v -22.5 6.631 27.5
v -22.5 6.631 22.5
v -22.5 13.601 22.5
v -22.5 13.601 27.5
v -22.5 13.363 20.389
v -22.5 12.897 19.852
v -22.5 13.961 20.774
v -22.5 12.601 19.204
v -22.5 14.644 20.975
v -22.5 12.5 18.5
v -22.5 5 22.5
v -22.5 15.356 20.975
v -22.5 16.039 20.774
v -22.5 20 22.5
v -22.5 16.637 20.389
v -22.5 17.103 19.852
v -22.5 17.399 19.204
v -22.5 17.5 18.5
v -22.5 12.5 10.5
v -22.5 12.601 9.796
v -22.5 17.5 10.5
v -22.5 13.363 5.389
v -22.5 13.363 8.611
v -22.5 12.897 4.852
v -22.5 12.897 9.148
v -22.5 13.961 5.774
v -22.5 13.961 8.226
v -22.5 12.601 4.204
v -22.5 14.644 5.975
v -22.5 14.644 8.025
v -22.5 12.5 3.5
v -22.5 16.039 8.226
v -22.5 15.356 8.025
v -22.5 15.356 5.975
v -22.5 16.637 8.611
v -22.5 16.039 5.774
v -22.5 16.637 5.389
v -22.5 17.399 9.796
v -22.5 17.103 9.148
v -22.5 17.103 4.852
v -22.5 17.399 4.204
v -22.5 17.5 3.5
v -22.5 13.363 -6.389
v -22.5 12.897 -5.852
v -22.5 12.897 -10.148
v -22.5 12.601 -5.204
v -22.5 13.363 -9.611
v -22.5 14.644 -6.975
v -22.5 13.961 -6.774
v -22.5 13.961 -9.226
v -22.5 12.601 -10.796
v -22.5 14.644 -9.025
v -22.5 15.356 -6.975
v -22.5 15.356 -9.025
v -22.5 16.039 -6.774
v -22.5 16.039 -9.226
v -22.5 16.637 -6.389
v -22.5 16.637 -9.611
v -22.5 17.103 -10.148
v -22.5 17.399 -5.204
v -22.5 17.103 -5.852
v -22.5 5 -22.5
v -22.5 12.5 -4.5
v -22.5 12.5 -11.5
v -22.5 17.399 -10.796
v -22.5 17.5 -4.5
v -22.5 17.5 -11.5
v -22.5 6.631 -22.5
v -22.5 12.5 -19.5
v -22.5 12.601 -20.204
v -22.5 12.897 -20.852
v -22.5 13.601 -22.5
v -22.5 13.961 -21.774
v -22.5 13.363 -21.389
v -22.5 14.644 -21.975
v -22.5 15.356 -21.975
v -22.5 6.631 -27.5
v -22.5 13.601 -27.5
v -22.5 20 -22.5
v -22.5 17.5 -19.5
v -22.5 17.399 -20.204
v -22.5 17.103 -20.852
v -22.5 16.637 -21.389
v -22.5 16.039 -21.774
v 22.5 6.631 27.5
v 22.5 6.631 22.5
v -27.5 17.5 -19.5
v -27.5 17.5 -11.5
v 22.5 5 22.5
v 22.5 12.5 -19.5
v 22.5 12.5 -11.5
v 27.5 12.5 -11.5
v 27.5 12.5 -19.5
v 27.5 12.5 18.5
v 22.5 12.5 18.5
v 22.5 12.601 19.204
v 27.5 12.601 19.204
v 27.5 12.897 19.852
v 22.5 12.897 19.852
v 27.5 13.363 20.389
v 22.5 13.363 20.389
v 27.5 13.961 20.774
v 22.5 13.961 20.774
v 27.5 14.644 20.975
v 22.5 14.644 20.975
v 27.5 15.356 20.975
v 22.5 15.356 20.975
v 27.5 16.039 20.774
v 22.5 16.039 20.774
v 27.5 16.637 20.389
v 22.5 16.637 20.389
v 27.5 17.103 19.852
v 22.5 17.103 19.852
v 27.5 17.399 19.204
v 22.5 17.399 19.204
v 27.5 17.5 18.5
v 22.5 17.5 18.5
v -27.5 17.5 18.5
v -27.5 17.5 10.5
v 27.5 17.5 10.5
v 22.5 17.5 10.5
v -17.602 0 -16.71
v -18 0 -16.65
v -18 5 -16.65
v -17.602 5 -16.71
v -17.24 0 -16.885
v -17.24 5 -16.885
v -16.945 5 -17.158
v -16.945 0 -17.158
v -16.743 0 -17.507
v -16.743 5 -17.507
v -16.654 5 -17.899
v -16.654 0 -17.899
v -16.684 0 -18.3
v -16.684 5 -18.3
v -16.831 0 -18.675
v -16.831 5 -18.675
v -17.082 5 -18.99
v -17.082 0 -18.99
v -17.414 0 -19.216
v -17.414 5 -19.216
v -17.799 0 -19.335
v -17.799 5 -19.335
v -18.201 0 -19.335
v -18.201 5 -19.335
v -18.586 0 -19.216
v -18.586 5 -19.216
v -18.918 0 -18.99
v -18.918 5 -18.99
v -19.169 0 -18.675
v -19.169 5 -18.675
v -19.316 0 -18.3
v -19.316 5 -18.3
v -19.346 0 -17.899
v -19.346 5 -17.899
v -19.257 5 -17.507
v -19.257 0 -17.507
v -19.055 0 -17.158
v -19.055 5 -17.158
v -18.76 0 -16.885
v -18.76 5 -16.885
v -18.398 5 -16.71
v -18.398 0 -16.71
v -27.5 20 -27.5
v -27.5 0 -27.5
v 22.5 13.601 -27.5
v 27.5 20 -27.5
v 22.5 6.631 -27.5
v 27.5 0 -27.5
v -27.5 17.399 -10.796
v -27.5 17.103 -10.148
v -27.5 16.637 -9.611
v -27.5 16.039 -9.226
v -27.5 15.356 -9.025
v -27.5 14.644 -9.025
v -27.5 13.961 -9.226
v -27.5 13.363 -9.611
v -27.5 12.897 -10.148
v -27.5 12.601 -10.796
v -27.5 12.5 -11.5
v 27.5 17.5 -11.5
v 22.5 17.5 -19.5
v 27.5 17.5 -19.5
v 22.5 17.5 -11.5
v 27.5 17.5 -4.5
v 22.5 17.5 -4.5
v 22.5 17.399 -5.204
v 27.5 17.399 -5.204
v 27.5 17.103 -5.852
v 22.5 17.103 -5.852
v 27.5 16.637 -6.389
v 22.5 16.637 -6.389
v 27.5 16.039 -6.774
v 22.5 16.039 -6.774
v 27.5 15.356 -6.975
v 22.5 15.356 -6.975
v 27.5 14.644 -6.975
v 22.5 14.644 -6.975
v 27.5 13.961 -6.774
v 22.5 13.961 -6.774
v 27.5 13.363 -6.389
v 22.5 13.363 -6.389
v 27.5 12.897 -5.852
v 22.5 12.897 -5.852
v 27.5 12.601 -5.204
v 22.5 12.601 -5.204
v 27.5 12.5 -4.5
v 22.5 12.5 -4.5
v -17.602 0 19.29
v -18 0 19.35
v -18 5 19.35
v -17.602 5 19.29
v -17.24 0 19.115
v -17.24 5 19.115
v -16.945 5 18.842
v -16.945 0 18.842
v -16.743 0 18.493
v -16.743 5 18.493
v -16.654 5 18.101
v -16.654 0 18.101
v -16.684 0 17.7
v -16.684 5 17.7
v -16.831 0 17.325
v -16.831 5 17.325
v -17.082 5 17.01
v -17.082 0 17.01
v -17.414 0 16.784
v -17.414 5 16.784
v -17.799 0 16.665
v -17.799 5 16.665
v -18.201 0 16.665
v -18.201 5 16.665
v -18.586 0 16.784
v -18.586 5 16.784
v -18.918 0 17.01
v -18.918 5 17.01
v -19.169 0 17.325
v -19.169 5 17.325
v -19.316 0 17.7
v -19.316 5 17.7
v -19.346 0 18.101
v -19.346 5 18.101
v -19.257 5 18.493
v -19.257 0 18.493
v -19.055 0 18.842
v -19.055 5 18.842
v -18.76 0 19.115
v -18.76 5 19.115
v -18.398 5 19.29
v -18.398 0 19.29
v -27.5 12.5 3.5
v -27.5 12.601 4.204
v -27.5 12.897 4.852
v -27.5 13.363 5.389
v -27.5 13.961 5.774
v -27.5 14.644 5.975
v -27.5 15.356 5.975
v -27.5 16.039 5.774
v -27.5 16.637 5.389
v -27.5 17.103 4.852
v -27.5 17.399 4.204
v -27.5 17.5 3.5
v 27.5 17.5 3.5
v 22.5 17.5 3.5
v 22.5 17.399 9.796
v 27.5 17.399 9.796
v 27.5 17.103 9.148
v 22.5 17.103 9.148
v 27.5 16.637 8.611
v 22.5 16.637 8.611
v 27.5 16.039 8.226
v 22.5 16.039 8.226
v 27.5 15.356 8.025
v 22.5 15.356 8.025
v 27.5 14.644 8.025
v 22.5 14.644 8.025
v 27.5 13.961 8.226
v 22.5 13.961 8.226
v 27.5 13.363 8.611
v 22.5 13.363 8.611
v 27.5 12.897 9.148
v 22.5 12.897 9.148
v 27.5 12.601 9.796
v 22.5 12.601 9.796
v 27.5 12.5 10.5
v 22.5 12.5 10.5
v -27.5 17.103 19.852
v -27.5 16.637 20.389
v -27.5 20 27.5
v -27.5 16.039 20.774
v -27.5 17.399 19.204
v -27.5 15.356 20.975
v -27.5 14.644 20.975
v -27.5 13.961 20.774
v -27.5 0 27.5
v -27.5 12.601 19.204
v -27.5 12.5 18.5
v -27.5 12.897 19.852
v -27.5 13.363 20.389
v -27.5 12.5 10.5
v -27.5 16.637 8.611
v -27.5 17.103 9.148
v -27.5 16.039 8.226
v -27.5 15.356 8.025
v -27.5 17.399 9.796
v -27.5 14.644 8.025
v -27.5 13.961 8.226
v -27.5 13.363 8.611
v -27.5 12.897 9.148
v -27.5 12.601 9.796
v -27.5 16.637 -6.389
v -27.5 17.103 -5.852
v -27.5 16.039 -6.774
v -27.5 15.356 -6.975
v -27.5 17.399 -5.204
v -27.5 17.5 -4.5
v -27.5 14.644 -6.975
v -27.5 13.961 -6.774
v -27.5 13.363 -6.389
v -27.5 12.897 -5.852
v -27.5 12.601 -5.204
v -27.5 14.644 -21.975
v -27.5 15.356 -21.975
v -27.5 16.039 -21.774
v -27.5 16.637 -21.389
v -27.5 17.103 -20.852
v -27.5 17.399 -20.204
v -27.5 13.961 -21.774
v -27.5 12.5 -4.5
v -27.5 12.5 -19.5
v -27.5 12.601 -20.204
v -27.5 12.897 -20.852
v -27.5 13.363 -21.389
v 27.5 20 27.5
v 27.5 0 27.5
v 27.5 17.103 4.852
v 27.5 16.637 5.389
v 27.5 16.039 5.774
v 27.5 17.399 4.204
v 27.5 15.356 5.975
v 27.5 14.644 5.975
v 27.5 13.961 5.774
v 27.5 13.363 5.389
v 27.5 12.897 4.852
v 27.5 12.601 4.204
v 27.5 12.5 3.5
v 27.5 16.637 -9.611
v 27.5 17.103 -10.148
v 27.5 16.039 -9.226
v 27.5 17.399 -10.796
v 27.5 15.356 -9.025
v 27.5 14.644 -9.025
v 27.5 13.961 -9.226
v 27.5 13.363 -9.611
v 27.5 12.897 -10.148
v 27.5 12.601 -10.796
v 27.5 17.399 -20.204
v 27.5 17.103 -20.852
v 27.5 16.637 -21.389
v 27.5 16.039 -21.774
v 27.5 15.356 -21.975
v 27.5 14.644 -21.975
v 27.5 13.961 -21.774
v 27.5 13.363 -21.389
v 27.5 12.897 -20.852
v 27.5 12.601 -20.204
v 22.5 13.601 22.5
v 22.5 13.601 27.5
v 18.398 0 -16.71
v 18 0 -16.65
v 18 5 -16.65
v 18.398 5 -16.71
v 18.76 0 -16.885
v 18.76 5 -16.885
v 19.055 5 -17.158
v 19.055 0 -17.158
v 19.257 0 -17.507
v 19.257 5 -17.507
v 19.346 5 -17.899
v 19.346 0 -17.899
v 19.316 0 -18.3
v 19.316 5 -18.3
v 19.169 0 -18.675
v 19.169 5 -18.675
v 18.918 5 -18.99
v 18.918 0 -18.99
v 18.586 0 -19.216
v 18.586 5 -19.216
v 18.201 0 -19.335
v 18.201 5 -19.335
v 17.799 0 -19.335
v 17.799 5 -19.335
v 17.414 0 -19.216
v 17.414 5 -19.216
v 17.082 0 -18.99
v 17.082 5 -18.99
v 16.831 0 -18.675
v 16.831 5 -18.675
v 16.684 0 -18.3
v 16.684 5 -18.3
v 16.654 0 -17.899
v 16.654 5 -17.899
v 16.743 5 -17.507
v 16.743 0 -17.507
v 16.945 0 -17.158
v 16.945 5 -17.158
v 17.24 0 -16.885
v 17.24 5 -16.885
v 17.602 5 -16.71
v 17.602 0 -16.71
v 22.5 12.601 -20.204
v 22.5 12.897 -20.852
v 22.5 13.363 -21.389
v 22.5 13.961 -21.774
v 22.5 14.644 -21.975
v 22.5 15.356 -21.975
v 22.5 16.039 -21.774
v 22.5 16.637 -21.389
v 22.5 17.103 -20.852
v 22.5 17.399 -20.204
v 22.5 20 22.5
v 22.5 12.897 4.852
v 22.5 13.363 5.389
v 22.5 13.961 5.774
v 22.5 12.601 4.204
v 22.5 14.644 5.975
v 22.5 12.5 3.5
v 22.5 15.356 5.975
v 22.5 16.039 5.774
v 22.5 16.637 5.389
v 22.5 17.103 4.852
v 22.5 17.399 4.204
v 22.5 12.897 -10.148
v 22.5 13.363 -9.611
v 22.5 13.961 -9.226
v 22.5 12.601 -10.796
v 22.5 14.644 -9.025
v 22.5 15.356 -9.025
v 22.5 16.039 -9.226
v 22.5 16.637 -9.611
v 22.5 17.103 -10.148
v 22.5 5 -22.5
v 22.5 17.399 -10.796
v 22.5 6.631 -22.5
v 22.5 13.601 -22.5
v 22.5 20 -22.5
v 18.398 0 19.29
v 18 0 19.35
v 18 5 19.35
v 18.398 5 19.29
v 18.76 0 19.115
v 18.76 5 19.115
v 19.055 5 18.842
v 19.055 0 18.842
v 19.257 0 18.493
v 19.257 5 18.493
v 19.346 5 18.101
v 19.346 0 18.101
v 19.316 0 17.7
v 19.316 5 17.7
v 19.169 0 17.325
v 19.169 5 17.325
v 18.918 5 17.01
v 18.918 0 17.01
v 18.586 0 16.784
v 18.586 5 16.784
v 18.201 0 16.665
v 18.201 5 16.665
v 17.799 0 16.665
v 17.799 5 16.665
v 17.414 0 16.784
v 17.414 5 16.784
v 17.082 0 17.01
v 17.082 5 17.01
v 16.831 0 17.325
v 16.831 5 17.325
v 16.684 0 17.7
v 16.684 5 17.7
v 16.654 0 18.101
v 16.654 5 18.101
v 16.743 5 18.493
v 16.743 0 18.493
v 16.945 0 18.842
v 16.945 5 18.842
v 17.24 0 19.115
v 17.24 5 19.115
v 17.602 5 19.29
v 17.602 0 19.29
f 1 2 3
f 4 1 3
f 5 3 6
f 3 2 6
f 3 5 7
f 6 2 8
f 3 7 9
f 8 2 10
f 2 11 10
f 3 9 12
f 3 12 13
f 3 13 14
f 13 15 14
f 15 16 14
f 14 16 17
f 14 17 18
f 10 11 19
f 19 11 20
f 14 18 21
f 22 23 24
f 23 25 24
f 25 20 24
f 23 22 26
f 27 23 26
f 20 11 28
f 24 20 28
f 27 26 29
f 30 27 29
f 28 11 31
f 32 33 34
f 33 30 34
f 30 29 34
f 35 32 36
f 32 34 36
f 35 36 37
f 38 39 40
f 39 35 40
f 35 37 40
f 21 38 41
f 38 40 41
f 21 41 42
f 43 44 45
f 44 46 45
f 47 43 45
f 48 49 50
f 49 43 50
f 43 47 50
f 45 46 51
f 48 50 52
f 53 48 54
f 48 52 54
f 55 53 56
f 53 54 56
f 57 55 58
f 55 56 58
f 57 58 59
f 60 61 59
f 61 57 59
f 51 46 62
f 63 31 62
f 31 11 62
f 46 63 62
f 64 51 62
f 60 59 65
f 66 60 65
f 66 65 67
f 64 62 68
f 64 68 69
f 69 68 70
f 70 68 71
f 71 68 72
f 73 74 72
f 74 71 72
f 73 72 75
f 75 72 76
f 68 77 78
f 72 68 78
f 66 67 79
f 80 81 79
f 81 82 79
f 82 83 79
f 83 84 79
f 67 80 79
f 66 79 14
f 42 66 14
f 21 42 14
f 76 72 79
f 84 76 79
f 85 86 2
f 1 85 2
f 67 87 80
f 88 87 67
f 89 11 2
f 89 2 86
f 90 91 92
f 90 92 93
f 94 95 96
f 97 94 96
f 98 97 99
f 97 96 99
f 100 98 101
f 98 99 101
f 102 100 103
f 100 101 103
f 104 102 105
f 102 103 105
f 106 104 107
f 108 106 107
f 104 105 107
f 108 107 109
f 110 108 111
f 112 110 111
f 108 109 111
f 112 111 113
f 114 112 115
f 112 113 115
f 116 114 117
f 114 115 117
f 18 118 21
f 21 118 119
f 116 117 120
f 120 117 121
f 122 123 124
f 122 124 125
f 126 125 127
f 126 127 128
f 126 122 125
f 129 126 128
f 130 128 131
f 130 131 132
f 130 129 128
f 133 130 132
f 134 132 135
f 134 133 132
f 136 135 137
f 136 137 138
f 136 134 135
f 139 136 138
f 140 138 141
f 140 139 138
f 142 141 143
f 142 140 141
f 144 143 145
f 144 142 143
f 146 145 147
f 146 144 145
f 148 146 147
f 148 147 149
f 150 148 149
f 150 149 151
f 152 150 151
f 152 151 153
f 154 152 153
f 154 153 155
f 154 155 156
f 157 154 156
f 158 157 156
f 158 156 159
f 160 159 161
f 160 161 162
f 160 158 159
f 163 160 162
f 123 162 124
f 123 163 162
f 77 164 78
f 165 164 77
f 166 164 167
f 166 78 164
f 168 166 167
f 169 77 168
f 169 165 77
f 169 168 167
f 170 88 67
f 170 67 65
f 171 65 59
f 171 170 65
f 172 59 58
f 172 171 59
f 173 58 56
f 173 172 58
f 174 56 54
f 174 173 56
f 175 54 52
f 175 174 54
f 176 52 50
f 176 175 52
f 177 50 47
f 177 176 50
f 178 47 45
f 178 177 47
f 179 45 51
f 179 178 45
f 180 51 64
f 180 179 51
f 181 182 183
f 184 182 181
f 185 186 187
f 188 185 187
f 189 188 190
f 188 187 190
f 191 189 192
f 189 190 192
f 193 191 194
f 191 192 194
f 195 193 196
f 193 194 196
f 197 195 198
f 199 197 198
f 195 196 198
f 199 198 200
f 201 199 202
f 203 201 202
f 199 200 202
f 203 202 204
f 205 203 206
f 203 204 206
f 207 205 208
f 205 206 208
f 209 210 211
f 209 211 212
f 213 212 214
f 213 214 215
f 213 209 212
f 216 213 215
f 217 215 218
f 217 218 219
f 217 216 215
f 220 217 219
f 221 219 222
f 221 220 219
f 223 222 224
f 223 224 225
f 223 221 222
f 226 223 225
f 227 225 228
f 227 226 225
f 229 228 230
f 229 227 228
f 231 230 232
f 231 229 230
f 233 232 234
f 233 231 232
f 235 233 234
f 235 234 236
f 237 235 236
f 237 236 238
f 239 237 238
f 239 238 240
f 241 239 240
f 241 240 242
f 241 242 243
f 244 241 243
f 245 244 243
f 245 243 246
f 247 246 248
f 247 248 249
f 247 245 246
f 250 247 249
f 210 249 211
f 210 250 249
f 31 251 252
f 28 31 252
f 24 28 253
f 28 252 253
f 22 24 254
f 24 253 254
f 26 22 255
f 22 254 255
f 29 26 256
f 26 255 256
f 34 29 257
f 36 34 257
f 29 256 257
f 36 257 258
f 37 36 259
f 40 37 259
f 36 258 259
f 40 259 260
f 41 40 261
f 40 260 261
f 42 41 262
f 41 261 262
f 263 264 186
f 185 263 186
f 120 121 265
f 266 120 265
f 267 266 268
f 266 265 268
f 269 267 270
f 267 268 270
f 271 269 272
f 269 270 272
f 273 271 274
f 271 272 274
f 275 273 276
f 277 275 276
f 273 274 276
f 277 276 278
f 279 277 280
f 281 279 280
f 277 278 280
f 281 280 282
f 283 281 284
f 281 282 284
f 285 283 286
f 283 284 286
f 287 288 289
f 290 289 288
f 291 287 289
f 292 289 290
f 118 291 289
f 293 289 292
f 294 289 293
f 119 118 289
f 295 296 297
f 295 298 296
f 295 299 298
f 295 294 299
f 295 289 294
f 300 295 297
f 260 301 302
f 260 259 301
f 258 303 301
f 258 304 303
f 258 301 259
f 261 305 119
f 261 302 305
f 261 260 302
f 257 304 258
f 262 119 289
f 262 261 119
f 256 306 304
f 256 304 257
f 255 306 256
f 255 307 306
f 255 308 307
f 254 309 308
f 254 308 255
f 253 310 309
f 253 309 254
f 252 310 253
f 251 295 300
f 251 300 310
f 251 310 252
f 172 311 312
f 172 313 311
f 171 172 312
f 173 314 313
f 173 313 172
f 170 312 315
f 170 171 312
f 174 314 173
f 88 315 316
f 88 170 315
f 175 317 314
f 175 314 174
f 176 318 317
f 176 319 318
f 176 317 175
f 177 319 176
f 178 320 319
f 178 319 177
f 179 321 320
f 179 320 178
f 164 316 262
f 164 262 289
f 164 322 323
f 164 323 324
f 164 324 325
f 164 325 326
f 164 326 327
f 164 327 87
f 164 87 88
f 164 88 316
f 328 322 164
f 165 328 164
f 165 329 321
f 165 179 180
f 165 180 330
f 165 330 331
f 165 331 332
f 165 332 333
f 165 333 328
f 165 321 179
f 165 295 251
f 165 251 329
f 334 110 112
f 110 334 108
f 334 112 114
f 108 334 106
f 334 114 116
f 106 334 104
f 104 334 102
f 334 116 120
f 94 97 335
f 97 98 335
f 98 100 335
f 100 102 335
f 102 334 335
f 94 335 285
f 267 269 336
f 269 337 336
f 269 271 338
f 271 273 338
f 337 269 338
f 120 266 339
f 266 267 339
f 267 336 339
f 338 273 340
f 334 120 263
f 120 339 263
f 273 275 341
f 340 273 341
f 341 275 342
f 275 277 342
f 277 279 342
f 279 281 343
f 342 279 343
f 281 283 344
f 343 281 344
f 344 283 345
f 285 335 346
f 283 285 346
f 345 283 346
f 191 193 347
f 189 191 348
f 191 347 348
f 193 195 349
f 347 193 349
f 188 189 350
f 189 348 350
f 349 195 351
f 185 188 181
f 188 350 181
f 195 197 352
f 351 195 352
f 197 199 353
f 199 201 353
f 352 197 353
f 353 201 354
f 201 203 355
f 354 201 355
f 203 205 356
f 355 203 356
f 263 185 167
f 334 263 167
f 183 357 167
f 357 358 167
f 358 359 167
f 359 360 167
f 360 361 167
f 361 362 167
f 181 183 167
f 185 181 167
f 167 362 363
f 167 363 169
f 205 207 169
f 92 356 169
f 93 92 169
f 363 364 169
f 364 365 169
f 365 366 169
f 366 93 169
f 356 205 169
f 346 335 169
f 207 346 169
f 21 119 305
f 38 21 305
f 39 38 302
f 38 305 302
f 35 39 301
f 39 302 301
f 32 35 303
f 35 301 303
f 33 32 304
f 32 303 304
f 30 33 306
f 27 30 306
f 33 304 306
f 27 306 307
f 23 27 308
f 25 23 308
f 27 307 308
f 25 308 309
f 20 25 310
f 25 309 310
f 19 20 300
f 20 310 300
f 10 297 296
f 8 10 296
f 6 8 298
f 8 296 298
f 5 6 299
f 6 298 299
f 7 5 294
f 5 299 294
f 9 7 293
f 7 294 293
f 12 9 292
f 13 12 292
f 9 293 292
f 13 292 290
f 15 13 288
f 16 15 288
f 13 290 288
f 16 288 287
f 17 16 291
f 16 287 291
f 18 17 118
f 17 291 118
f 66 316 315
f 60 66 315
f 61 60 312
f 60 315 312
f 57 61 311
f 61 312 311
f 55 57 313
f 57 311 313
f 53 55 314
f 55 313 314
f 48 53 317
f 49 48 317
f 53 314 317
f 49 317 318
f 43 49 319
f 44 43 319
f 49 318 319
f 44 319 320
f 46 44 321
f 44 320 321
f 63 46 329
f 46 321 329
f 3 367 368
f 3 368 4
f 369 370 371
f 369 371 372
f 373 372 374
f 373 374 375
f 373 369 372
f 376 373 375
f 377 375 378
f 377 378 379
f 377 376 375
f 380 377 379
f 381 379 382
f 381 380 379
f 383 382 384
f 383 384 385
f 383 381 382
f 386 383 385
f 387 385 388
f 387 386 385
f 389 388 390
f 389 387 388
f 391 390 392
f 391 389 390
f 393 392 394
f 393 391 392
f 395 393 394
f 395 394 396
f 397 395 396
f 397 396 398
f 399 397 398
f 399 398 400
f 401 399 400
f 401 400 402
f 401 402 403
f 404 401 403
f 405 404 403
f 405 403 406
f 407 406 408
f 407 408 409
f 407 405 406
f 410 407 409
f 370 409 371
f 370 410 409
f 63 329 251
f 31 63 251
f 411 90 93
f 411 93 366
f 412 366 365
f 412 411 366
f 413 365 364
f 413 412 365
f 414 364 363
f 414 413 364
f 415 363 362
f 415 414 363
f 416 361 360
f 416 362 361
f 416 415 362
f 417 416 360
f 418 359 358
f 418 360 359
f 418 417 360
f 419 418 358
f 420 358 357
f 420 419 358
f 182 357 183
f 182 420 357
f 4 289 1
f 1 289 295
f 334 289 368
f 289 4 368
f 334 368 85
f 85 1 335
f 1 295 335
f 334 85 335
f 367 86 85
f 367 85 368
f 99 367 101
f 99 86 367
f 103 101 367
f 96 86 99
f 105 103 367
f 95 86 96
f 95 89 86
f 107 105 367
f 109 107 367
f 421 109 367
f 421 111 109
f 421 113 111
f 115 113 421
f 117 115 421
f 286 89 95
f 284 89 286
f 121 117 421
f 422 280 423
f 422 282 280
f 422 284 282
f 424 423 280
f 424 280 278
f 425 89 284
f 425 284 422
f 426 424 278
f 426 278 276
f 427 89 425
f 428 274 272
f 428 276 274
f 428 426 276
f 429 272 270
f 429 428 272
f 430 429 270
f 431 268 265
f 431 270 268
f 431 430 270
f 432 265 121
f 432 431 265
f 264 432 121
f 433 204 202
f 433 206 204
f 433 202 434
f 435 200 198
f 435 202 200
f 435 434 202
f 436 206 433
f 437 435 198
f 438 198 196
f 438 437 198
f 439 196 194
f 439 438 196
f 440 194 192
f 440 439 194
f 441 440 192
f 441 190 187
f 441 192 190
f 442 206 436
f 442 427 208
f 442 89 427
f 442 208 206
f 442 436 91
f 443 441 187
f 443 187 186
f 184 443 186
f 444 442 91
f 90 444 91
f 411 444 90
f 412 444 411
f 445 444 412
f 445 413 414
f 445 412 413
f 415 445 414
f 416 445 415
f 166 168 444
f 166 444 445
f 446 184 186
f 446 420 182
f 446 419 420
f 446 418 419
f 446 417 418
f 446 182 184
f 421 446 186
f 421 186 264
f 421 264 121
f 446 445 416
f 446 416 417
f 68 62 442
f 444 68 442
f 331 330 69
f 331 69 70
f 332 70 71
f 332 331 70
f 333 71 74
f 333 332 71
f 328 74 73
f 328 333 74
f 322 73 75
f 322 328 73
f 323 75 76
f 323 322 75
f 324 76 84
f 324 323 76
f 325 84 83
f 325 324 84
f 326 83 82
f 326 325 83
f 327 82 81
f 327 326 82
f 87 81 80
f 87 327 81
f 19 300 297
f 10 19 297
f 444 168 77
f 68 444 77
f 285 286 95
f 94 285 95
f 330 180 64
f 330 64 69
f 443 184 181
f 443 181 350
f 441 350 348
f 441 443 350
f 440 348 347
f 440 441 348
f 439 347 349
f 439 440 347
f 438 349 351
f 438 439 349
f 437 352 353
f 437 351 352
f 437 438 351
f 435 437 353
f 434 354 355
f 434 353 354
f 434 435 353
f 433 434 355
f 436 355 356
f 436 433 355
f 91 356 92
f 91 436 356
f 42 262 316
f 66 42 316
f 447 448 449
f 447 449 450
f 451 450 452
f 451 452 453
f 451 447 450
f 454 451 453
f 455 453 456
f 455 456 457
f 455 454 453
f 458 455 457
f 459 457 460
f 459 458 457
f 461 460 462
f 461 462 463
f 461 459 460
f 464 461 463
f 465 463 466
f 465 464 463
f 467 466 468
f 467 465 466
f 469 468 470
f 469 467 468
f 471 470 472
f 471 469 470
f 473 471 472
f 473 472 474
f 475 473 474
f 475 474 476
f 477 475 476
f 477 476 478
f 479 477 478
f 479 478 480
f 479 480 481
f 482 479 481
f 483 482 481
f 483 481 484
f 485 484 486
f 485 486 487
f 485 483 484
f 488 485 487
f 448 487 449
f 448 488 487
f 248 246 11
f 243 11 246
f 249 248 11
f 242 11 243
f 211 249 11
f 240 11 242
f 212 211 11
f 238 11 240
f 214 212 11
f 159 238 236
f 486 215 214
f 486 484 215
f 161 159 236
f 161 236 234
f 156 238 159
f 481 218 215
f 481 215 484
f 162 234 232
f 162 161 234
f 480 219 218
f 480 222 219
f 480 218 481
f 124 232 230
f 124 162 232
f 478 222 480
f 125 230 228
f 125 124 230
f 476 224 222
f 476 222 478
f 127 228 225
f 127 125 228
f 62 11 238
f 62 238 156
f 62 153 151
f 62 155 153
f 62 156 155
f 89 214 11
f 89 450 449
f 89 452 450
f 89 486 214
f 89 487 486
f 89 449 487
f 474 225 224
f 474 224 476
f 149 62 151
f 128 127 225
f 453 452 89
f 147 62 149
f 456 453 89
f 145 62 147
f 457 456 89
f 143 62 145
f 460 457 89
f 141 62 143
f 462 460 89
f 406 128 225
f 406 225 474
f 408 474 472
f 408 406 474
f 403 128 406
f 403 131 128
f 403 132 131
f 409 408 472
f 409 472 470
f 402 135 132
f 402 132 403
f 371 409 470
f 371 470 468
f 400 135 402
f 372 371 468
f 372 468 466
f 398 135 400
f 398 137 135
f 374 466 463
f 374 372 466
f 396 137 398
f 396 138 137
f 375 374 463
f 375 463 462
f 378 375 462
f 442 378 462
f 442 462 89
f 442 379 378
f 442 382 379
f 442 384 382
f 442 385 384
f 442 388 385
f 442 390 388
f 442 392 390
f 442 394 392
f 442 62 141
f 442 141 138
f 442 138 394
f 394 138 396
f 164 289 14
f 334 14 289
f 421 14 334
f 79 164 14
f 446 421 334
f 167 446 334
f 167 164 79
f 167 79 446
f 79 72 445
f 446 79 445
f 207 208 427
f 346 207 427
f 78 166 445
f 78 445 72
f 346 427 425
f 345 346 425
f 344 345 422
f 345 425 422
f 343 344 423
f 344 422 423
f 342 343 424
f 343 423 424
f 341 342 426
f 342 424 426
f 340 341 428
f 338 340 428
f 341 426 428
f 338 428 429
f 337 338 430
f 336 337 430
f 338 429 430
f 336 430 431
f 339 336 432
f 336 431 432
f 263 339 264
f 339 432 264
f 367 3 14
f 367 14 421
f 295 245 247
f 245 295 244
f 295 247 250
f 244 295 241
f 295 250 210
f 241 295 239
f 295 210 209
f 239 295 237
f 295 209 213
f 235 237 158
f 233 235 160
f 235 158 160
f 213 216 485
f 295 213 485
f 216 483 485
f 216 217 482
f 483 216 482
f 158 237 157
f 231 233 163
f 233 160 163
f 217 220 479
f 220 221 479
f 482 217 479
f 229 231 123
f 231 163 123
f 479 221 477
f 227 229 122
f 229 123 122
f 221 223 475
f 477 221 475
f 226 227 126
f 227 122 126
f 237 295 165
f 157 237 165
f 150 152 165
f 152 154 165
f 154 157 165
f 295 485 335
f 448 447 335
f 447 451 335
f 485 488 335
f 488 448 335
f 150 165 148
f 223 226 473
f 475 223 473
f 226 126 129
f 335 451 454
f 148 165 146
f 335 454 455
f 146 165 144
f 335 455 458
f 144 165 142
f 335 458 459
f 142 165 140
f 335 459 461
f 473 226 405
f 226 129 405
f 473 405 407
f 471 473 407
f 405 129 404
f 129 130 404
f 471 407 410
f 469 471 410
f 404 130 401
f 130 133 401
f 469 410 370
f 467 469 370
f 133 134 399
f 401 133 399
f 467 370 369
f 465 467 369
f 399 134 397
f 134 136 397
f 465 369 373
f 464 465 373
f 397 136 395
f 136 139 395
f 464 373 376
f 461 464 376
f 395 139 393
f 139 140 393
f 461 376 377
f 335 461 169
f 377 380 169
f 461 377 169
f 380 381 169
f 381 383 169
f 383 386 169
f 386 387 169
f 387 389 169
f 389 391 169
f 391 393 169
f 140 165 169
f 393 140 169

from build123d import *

# Parameters (mm, degrees)
SKETCH1_W           = 45
SKETCH1_H           = 45
SKETCH1_R           = 1.35
BOSS_EXTRUDE1_DEPTH = 5
SKETCH2_W           = 55
SKETCH2_H           = 55
SKETCH2_W_2         = 45
SKETCH2_H_2         = 45
BOSS_EXTRUDE2_DEPTH = 20
SKETCH3_W           = 45
SKETCH3_H           = 6.969851319
CUT_EXTRUDE1_DEPTH  = 65.662585782
CUT_EXTRUDE2_DEPTH  = 65.662585782
CUT_EXTRUDE3_DEPTH  = 67.801946079


with BuildPart() as part:
    # Sketch1 → Boss-Extrude1 (new body)
    with BuildSketch(Plane(origin=(0, 0, 0), x_dir=(1, 0, 0), z_dir=(0, 1, 0))):
        Rectangle(SKETCH1_W, SKETCH1_H)
        with Locations(Location((-18, 18, 0), (0, 0, 270))):
            Circle(SKETCH1_R, mode=Mode.SUBTRACT)
        with Locations(Location((18, 18, 0), (0, 0, 270))):
            Circle(SKETCH1_R, mode=Mode.SUBTRACT)
        with Locations(Location((18, -18, 0), (0, 0, 270))):
            Circle(SKETCH1_R, mode=Mode.SUBTRACT)
        with Locations(Location((-18, -18, 0), (0, 0, 270))):
            Circle(SKETCH1_R, mode=Mode.SUBTRACT)
    extrude(amount=BOSS_EXTRUDE1_DEPTH)

    # Sketch2 → Boss-Extrude2 (add)
    with BuildSketch(Plane(origin=(0, 0, 0), x_dir=(1, 0, 0), z_dir=(0, 1, 0))):
        Rectangle(SKETCH2_W, SKETCH2_H)
        Rectangle(SKETCH2_W_2, SKETCH2_H_2, mode=Mode.SUBTRACT)
    extrude(amount=BOSS_EXTRUDE2_DEPTH)

    # Sketch3 → Cut-Extrude1 (cut, through all)
    with BuildSketch(Plane(origin=(0, 0, -27.5), x_dir=(-1, 0, 0), z_dir=(0, 0, -1))):
        with Locations((0, 10.115904606)):
            Rectangle(SKETCH3_W, SKETCH3_H)
    extrude(amount=-CUT_EXTRUDE1_DEPTH, mode=Mode.SUBTRACT)

    # Sketch4 → Cut-Extrude2 (cut, through all)
    with BuildSketch(Plane.ZY.offset(27.5)):
        with BuildLine():
            Line((-11.5, 12.5), (-19.5, 12.5))
            ThreePointArc((-19.5, 12.5), (-22, 15), (-19.5, 17.5))
            Line((-19.5, 17.5), (-11.5, 17.5))
            ThreePointArc((-11.5, 17.5), (-9, 15), (-11.5, 12.5))
        make_face()
        with BuildLine():
            Line((3.5, 17.5), (-4.5, 17.5))
            ThreePointArc((-4.5, 17.5), (-7, 15), (-4.5, 12.5))
            Line((-4.5, 12.5), (3.5, 12.5))
            ThreePointArc((3.5, 12.5), (6, 15), (3.5, 17.5))
        make_face()
        with BuildLine():
            Line((18.5, 17.5), (10.5, 17.5))
            ThreePointArc((10.5, 17.5), (8, 15), (10.5, 12.5))
            Line((10.5, 12.5), (18.5, 12.5))
            ThreePointArc((18.5, 12.5), (21, 15), (18.5, 17.5))
        make_face()
    extrude(amount=-CUT_EXTRUDE2_DEPTH, mode=Mode.SUBTRACT)

    # Sketch5 → Cut-Extrude3 (cut, through all)
    with BuildSketch(Plane(origin=(0, 0, -30), x_dir=(-1, 0, 0), z_dir=(0, 0, -1))):
        with BuildLine():
            Line((-7.5, 33), (7.5, 33))
            ThreePointArc((7.5, 33), (10.5, 30), (7.5, 27))
            Line((7.5, 27), (-7.5, 27))
            ThreePointArc((-7.5, 27), (-10.5, 30), (-7.5, 33))
        make_face()
    extrude(amount=-CUT_EXTRUDE3_DEPTH, mode=Mode.SUBTRACT)


solid = part.part
